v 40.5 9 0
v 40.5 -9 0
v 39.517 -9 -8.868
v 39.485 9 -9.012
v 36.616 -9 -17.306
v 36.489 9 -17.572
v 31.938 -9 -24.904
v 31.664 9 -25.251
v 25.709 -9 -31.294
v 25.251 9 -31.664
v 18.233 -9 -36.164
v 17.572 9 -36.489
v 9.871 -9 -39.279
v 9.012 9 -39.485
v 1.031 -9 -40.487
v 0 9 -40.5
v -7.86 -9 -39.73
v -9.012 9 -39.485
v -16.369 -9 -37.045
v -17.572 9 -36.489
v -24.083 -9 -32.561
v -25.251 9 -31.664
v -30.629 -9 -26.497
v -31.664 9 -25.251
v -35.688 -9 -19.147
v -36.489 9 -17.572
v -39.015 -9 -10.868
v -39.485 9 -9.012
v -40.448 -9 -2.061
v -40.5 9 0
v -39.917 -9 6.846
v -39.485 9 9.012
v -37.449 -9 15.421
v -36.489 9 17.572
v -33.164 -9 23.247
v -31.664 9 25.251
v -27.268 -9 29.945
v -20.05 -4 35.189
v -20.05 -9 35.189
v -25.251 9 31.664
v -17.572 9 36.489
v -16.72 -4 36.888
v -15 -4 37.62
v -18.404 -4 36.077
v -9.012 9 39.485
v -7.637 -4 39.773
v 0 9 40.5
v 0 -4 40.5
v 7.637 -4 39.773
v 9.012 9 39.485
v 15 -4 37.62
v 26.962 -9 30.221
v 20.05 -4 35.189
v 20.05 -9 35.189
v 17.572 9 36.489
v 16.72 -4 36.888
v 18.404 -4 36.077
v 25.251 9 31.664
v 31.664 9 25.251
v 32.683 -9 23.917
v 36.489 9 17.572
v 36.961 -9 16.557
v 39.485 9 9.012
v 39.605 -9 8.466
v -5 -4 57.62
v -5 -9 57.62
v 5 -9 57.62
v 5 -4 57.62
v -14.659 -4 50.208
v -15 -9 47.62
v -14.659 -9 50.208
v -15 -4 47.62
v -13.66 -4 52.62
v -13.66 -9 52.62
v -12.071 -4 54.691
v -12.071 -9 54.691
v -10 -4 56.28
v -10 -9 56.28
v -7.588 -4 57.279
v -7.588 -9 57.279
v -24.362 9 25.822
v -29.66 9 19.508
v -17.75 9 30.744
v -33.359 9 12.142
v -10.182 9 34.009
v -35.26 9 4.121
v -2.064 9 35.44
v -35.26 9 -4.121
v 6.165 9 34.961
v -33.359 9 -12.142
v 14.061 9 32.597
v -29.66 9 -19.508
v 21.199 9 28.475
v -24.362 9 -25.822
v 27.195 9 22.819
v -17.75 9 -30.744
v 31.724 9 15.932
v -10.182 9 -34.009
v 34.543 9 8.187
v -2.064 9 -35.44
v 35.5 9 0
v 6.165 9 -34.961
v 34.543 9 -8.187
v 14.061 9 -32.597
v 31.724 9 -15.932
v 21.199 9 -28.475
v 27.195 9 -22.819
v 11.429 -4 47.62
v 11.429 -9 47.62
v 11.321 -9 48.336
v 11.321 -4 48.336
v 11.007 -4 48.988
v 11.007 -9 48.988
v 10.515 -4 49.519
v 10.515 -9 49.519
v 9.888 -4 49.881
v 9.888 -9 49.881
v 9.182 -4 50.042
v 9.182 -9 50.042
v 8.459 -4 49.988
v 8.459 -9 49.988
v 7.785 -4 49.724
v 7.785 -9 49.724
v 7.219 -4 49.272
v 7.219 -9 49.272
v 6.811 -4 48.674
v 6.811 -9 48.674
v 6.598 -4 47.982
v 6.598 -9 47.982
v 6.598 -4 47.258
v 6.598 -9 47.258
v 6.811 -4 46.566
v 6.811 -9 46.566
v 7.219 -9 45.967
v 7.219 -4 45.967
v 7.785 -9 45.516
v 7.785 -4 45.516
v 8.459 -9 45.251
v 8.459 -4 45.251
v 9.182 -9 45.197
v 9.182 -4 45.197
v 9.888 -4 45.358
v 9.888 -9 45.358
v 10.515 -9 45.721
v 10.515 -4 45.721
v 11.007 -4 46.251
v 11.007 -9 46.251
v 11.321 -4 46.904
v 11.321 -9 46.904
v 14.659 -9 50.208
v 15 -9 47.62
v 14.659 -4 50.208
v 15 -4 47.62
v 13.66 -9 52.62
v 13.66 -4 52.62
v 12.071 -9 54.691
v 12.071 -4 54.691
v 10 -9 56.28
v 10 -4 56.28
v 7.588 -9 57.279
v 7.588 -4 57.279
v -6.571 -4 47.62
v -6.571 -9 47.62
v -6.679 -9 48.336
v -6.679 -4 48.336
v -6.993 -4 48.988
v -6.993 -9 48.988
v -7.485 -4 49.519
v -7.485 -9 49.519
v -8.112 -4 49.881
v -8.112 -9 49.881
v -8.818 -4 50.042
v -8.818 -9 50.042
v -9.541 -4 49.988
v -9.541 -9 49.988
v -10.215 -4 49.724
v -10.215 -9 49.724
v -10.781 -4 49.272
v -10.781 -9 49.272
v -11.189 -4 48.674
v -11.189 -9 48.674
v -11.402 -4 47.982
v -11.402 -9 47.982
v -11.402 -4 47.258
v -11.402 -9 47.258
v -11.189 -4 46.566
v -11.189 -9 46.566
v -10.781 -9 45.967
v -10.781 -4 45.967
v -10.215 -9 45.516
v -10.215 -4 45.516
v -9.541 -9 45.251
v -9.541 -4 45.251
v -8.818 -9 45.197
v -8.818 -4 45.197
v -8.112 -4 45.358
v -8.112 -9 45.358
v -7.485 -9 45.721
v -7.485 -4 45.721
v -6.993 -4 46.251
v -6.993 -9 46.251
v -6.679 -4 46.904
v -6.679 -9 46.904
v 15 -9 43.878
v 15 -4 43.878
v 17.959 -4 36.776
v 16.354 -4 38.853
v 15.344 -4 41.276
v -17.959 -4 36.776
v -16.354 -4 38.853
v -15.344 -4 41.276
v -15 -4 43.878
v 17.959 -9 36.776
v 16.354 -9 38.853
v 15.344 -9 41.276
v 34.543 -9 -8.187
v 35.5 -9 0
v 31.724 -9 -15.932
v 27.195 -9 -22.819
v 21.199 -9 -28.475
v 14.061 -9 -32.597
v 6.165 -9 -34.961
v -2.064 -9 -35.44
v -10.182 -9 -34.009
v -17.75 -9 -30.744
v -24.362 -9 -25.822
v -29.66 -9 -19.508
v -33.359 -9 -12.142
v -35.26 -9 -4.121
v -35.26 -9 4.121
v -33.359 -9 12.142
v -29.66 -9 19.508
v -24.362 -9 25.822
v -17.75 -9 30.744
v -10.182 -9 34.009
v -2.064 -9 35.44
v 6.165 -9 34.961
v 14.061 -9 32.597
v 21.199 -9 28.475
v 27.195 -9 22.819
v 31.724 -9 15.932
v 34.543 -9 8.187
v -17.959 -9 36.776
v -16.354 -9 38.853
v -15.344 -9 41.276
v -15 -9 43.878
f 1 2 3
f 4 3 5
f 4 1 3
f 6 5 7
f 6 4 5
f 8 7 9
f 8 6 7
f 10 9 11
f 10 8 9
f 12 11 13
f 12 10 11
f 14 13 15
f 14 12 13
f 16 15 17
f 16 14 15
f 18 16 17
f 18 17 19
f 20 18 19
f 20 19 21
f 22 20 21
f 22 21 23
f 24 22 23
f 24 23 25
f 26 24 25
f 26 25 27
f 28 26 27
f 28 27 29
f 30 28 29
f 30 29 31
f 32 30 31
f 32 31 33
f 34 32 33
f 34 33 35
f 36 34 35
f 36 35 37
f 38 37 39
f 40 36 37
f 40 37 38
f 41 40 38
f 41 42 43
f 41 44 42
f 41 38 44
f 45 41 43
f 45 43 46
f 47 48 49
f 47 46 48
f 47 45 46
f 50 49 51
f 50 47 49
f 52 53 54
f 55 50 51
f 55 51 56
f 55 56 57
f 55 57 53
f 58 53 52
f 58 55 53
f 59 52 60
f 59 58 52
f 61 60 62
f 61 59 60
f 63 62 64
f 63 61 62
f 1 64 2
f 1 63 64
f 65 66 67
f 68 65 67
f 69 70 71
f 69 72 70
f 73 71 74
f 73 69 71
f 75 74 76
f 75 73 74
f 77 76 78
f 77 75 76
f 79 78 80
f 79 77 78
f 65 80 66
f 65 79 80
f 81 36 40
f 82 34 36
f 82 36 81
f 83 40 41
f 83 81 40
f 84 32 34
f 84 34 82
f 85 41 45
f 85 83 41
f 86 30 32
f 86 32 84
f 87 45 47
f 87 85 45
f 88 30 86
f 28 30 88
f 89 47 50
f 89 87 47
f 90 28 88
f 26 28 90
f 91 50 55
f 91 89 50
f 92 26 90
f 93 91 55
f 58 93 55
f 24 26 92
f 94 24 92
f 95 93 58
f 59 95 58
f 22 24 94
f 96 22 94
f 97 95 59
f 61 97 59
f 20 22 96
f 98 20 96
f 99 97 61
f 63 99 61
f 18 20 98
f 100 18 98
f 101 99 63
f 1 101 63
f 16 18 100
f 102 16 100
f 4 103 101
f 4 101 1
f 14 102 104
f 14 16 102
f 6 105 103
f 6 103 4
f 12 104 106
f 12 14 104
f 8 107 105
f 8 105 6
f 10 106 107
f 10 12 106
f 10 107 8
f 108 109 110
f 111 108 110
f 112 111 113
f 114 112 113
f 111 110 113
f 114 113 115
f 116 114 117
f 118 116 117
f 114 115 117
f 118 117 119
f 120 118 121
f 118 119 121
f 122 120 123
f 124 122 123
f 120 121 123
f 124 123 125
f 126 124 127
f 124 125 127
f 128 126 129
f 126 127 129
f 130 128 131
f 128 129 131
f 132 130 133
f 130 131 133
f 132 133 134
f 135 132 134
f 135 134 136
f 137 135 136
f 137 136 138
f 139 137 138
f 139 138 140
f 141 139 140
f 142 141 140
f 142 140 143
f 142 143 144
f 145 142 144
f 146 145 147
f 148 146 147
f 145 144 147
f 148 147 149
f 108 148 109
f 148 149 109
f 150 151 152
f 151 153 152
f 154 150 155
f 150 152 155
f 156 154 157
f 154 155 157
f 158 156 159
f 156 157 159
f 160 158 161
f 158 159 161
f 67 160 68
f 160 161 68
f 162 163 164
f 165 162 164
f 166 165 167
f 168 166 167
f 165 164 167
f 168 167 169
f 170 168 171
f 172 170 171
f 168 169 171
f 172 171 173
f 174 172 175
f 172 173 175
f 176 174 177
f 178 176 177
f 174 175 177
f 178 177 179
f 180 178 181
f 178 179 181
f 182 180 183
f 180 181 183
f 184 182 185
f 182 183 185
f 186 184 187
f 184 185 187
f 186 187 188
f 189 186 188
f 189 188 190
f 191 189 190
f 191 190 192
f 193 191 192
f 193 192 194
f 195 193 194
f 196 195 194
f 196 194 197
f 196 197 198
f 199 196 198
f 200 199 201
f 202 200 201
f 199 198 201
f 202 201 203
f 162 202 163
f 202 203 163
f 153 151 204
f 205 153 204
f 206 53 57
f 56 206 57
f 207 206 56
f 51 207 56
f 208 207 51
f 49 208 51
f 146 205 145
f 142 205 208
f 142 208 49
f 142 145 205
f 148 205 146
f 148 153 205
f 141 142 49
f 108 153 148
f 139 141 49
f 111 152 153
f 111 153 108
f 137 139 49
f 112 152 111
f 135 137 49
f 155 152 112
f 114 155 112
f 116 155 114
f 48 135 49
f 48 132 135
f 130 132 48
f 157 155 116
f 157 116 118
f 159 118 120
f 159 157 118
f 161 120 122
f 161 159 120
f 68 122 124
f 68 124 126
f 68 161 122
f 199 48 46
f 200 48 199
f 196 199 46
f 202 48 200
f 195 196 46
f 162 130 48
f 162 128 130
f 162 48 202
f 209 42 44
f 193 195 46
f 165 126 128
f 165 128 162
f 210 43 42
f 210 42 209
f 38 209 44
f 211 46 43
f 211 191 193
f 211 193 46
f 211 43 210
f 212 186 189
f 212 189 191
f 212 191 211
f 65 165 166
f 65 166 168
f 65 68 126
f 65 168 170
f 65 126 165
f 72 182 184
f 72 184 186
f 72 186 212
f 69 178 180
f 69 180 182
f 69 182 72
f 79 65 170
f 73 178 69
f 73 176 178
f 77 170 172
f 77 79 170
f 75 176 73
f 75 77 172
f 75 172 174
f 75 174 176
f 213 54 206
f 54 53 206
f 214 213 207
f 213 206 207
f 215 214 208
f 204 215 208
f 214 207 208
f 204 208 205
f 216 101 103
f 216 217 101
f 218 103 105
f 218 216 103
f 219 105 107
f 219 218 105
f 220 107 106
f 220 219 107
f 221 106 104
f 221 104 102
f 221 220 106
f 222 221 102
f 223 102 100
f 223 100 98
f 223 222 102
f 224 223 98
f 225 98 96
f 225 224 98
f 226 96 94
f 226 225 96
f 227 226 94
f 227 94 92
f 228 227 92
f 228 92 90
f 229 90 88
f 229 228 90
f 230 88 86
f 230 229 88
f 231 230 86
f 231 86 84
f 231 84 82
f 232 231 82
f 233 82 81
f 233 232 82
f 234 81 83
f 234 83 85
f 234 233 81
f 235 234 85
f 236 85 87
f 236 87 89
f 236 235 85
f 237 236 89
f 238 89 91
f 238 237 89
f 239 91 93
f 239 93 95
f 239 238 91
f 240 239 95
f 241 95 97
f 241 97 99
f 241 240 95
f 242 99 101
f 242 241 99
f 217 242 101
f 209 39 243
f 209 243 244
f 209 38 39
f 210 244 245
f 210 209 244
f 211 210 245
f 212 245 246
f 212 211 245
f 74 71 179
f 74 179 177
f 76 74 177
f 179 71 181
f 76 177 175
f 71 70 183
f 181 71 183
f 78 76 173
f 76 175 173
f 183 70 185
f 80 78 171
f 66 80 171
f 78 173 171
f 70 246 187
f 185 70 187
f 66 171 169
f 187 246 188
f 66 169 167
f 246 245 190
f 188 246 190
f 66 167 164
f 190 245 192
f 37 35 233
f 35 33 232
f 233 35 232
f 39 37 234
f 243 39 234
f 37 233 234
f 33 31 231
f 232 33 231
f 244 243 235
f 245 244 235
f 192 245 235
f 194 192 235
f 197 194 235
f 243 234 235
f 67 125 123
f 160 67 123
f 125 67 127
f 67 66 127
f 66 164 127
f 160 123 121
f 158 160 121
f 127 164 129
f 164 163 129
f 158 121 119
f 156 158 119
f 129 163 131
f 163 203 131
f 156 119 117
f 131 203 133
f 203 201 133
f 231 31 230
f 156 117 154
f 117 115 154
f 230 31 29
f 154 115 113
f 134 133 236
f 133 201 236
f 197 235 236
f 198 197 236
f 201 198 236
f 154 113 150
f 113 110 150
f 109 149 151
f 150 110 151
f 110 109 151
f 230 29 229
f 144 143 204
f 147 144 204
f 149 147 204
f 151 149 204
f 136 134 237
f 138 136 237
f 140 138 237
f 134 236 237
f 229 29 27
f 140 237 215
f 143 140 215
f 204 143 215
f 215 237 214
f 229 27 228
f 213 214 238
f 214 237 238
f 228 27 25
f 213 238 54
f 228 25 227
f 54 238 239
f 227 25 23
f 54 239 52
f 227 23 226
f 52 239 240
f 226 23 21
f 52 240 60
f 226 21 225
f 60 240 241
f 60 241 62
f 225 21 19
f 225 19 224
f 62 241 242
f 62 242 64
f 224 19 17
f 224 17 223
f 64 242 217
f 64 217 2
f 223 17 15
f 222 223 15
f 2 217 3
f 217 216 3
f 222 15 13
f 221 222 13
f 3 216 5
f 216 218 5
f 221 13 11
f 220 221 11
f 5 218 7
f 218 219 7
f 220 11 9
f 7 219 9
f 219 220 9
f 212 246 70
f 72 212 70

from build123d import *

# Parameters (mm, degrees)
CROQUIS1_R              = 40.5
CROQUIS1_R_2            = 35.5
SALIENTE_EXTRUIR1_DEPTH = 9
CROQUIS2_R              = 2.429274189
SALIENTE_EXTRUIR2_DEPTH = 5
REDONDEO1_R             = 10


with BuildPart() as part:
    # Croquis1 → Saliente-Extruir1 (new body, symmetric)
    with BuildSketch(Plane(origin=(0, 0, 0), x_dir=(1, 0, 0), z_dir=(0, 1, 0))):
        Circle(CROQUIS1_R)
        Circle(CROQUIS1_R_2, mode=Mode.SUBTRACT)
    extrude(amount=SALIENTE_EXTRUIR1_DEPTH, both=True)

    # Croquis2 → Saliente-Extruir2 (add)
    with BuildSketch(Plane.XZ.offset(9)):
        with BuildLine():
            Line((-15, 37.619808612), (-15, 57.619808612))
            Line((-15, 57.619808612), (15, 57.619808612))
            Line((15, 57.619808612), (15, 37.619808612))
            ThreePointArc((15, 37.619808612), (0, 40.5), (-15, 37.619808612))
        make_face()
        with Locations((-9, 47.619808612)):
            Circle(CROQUIS2_R, mode=Mode.SUBTRACT)
        with Locations((9, 47.619808612)):
            Circle(CROQUIS2_R, mode=Mode.SUBTRACT)
    extrude(amount=-SALIENTE_EXTRUIR2_DEPTH)

    # Redondeo1
    redondeo1_edges = [part.edges().sort_by_distance(p)[0] for p in [
        (15, -6.5, 37.619808612),
        (-15, -6.5, 37.619808612),
        (-15, -6.5, 57.619808612),
        (15, -6.5, 57.619808612),
    ]]
    fillet(redondeo1_edges, radius=REDONDEO1_R)


solid = part.part
